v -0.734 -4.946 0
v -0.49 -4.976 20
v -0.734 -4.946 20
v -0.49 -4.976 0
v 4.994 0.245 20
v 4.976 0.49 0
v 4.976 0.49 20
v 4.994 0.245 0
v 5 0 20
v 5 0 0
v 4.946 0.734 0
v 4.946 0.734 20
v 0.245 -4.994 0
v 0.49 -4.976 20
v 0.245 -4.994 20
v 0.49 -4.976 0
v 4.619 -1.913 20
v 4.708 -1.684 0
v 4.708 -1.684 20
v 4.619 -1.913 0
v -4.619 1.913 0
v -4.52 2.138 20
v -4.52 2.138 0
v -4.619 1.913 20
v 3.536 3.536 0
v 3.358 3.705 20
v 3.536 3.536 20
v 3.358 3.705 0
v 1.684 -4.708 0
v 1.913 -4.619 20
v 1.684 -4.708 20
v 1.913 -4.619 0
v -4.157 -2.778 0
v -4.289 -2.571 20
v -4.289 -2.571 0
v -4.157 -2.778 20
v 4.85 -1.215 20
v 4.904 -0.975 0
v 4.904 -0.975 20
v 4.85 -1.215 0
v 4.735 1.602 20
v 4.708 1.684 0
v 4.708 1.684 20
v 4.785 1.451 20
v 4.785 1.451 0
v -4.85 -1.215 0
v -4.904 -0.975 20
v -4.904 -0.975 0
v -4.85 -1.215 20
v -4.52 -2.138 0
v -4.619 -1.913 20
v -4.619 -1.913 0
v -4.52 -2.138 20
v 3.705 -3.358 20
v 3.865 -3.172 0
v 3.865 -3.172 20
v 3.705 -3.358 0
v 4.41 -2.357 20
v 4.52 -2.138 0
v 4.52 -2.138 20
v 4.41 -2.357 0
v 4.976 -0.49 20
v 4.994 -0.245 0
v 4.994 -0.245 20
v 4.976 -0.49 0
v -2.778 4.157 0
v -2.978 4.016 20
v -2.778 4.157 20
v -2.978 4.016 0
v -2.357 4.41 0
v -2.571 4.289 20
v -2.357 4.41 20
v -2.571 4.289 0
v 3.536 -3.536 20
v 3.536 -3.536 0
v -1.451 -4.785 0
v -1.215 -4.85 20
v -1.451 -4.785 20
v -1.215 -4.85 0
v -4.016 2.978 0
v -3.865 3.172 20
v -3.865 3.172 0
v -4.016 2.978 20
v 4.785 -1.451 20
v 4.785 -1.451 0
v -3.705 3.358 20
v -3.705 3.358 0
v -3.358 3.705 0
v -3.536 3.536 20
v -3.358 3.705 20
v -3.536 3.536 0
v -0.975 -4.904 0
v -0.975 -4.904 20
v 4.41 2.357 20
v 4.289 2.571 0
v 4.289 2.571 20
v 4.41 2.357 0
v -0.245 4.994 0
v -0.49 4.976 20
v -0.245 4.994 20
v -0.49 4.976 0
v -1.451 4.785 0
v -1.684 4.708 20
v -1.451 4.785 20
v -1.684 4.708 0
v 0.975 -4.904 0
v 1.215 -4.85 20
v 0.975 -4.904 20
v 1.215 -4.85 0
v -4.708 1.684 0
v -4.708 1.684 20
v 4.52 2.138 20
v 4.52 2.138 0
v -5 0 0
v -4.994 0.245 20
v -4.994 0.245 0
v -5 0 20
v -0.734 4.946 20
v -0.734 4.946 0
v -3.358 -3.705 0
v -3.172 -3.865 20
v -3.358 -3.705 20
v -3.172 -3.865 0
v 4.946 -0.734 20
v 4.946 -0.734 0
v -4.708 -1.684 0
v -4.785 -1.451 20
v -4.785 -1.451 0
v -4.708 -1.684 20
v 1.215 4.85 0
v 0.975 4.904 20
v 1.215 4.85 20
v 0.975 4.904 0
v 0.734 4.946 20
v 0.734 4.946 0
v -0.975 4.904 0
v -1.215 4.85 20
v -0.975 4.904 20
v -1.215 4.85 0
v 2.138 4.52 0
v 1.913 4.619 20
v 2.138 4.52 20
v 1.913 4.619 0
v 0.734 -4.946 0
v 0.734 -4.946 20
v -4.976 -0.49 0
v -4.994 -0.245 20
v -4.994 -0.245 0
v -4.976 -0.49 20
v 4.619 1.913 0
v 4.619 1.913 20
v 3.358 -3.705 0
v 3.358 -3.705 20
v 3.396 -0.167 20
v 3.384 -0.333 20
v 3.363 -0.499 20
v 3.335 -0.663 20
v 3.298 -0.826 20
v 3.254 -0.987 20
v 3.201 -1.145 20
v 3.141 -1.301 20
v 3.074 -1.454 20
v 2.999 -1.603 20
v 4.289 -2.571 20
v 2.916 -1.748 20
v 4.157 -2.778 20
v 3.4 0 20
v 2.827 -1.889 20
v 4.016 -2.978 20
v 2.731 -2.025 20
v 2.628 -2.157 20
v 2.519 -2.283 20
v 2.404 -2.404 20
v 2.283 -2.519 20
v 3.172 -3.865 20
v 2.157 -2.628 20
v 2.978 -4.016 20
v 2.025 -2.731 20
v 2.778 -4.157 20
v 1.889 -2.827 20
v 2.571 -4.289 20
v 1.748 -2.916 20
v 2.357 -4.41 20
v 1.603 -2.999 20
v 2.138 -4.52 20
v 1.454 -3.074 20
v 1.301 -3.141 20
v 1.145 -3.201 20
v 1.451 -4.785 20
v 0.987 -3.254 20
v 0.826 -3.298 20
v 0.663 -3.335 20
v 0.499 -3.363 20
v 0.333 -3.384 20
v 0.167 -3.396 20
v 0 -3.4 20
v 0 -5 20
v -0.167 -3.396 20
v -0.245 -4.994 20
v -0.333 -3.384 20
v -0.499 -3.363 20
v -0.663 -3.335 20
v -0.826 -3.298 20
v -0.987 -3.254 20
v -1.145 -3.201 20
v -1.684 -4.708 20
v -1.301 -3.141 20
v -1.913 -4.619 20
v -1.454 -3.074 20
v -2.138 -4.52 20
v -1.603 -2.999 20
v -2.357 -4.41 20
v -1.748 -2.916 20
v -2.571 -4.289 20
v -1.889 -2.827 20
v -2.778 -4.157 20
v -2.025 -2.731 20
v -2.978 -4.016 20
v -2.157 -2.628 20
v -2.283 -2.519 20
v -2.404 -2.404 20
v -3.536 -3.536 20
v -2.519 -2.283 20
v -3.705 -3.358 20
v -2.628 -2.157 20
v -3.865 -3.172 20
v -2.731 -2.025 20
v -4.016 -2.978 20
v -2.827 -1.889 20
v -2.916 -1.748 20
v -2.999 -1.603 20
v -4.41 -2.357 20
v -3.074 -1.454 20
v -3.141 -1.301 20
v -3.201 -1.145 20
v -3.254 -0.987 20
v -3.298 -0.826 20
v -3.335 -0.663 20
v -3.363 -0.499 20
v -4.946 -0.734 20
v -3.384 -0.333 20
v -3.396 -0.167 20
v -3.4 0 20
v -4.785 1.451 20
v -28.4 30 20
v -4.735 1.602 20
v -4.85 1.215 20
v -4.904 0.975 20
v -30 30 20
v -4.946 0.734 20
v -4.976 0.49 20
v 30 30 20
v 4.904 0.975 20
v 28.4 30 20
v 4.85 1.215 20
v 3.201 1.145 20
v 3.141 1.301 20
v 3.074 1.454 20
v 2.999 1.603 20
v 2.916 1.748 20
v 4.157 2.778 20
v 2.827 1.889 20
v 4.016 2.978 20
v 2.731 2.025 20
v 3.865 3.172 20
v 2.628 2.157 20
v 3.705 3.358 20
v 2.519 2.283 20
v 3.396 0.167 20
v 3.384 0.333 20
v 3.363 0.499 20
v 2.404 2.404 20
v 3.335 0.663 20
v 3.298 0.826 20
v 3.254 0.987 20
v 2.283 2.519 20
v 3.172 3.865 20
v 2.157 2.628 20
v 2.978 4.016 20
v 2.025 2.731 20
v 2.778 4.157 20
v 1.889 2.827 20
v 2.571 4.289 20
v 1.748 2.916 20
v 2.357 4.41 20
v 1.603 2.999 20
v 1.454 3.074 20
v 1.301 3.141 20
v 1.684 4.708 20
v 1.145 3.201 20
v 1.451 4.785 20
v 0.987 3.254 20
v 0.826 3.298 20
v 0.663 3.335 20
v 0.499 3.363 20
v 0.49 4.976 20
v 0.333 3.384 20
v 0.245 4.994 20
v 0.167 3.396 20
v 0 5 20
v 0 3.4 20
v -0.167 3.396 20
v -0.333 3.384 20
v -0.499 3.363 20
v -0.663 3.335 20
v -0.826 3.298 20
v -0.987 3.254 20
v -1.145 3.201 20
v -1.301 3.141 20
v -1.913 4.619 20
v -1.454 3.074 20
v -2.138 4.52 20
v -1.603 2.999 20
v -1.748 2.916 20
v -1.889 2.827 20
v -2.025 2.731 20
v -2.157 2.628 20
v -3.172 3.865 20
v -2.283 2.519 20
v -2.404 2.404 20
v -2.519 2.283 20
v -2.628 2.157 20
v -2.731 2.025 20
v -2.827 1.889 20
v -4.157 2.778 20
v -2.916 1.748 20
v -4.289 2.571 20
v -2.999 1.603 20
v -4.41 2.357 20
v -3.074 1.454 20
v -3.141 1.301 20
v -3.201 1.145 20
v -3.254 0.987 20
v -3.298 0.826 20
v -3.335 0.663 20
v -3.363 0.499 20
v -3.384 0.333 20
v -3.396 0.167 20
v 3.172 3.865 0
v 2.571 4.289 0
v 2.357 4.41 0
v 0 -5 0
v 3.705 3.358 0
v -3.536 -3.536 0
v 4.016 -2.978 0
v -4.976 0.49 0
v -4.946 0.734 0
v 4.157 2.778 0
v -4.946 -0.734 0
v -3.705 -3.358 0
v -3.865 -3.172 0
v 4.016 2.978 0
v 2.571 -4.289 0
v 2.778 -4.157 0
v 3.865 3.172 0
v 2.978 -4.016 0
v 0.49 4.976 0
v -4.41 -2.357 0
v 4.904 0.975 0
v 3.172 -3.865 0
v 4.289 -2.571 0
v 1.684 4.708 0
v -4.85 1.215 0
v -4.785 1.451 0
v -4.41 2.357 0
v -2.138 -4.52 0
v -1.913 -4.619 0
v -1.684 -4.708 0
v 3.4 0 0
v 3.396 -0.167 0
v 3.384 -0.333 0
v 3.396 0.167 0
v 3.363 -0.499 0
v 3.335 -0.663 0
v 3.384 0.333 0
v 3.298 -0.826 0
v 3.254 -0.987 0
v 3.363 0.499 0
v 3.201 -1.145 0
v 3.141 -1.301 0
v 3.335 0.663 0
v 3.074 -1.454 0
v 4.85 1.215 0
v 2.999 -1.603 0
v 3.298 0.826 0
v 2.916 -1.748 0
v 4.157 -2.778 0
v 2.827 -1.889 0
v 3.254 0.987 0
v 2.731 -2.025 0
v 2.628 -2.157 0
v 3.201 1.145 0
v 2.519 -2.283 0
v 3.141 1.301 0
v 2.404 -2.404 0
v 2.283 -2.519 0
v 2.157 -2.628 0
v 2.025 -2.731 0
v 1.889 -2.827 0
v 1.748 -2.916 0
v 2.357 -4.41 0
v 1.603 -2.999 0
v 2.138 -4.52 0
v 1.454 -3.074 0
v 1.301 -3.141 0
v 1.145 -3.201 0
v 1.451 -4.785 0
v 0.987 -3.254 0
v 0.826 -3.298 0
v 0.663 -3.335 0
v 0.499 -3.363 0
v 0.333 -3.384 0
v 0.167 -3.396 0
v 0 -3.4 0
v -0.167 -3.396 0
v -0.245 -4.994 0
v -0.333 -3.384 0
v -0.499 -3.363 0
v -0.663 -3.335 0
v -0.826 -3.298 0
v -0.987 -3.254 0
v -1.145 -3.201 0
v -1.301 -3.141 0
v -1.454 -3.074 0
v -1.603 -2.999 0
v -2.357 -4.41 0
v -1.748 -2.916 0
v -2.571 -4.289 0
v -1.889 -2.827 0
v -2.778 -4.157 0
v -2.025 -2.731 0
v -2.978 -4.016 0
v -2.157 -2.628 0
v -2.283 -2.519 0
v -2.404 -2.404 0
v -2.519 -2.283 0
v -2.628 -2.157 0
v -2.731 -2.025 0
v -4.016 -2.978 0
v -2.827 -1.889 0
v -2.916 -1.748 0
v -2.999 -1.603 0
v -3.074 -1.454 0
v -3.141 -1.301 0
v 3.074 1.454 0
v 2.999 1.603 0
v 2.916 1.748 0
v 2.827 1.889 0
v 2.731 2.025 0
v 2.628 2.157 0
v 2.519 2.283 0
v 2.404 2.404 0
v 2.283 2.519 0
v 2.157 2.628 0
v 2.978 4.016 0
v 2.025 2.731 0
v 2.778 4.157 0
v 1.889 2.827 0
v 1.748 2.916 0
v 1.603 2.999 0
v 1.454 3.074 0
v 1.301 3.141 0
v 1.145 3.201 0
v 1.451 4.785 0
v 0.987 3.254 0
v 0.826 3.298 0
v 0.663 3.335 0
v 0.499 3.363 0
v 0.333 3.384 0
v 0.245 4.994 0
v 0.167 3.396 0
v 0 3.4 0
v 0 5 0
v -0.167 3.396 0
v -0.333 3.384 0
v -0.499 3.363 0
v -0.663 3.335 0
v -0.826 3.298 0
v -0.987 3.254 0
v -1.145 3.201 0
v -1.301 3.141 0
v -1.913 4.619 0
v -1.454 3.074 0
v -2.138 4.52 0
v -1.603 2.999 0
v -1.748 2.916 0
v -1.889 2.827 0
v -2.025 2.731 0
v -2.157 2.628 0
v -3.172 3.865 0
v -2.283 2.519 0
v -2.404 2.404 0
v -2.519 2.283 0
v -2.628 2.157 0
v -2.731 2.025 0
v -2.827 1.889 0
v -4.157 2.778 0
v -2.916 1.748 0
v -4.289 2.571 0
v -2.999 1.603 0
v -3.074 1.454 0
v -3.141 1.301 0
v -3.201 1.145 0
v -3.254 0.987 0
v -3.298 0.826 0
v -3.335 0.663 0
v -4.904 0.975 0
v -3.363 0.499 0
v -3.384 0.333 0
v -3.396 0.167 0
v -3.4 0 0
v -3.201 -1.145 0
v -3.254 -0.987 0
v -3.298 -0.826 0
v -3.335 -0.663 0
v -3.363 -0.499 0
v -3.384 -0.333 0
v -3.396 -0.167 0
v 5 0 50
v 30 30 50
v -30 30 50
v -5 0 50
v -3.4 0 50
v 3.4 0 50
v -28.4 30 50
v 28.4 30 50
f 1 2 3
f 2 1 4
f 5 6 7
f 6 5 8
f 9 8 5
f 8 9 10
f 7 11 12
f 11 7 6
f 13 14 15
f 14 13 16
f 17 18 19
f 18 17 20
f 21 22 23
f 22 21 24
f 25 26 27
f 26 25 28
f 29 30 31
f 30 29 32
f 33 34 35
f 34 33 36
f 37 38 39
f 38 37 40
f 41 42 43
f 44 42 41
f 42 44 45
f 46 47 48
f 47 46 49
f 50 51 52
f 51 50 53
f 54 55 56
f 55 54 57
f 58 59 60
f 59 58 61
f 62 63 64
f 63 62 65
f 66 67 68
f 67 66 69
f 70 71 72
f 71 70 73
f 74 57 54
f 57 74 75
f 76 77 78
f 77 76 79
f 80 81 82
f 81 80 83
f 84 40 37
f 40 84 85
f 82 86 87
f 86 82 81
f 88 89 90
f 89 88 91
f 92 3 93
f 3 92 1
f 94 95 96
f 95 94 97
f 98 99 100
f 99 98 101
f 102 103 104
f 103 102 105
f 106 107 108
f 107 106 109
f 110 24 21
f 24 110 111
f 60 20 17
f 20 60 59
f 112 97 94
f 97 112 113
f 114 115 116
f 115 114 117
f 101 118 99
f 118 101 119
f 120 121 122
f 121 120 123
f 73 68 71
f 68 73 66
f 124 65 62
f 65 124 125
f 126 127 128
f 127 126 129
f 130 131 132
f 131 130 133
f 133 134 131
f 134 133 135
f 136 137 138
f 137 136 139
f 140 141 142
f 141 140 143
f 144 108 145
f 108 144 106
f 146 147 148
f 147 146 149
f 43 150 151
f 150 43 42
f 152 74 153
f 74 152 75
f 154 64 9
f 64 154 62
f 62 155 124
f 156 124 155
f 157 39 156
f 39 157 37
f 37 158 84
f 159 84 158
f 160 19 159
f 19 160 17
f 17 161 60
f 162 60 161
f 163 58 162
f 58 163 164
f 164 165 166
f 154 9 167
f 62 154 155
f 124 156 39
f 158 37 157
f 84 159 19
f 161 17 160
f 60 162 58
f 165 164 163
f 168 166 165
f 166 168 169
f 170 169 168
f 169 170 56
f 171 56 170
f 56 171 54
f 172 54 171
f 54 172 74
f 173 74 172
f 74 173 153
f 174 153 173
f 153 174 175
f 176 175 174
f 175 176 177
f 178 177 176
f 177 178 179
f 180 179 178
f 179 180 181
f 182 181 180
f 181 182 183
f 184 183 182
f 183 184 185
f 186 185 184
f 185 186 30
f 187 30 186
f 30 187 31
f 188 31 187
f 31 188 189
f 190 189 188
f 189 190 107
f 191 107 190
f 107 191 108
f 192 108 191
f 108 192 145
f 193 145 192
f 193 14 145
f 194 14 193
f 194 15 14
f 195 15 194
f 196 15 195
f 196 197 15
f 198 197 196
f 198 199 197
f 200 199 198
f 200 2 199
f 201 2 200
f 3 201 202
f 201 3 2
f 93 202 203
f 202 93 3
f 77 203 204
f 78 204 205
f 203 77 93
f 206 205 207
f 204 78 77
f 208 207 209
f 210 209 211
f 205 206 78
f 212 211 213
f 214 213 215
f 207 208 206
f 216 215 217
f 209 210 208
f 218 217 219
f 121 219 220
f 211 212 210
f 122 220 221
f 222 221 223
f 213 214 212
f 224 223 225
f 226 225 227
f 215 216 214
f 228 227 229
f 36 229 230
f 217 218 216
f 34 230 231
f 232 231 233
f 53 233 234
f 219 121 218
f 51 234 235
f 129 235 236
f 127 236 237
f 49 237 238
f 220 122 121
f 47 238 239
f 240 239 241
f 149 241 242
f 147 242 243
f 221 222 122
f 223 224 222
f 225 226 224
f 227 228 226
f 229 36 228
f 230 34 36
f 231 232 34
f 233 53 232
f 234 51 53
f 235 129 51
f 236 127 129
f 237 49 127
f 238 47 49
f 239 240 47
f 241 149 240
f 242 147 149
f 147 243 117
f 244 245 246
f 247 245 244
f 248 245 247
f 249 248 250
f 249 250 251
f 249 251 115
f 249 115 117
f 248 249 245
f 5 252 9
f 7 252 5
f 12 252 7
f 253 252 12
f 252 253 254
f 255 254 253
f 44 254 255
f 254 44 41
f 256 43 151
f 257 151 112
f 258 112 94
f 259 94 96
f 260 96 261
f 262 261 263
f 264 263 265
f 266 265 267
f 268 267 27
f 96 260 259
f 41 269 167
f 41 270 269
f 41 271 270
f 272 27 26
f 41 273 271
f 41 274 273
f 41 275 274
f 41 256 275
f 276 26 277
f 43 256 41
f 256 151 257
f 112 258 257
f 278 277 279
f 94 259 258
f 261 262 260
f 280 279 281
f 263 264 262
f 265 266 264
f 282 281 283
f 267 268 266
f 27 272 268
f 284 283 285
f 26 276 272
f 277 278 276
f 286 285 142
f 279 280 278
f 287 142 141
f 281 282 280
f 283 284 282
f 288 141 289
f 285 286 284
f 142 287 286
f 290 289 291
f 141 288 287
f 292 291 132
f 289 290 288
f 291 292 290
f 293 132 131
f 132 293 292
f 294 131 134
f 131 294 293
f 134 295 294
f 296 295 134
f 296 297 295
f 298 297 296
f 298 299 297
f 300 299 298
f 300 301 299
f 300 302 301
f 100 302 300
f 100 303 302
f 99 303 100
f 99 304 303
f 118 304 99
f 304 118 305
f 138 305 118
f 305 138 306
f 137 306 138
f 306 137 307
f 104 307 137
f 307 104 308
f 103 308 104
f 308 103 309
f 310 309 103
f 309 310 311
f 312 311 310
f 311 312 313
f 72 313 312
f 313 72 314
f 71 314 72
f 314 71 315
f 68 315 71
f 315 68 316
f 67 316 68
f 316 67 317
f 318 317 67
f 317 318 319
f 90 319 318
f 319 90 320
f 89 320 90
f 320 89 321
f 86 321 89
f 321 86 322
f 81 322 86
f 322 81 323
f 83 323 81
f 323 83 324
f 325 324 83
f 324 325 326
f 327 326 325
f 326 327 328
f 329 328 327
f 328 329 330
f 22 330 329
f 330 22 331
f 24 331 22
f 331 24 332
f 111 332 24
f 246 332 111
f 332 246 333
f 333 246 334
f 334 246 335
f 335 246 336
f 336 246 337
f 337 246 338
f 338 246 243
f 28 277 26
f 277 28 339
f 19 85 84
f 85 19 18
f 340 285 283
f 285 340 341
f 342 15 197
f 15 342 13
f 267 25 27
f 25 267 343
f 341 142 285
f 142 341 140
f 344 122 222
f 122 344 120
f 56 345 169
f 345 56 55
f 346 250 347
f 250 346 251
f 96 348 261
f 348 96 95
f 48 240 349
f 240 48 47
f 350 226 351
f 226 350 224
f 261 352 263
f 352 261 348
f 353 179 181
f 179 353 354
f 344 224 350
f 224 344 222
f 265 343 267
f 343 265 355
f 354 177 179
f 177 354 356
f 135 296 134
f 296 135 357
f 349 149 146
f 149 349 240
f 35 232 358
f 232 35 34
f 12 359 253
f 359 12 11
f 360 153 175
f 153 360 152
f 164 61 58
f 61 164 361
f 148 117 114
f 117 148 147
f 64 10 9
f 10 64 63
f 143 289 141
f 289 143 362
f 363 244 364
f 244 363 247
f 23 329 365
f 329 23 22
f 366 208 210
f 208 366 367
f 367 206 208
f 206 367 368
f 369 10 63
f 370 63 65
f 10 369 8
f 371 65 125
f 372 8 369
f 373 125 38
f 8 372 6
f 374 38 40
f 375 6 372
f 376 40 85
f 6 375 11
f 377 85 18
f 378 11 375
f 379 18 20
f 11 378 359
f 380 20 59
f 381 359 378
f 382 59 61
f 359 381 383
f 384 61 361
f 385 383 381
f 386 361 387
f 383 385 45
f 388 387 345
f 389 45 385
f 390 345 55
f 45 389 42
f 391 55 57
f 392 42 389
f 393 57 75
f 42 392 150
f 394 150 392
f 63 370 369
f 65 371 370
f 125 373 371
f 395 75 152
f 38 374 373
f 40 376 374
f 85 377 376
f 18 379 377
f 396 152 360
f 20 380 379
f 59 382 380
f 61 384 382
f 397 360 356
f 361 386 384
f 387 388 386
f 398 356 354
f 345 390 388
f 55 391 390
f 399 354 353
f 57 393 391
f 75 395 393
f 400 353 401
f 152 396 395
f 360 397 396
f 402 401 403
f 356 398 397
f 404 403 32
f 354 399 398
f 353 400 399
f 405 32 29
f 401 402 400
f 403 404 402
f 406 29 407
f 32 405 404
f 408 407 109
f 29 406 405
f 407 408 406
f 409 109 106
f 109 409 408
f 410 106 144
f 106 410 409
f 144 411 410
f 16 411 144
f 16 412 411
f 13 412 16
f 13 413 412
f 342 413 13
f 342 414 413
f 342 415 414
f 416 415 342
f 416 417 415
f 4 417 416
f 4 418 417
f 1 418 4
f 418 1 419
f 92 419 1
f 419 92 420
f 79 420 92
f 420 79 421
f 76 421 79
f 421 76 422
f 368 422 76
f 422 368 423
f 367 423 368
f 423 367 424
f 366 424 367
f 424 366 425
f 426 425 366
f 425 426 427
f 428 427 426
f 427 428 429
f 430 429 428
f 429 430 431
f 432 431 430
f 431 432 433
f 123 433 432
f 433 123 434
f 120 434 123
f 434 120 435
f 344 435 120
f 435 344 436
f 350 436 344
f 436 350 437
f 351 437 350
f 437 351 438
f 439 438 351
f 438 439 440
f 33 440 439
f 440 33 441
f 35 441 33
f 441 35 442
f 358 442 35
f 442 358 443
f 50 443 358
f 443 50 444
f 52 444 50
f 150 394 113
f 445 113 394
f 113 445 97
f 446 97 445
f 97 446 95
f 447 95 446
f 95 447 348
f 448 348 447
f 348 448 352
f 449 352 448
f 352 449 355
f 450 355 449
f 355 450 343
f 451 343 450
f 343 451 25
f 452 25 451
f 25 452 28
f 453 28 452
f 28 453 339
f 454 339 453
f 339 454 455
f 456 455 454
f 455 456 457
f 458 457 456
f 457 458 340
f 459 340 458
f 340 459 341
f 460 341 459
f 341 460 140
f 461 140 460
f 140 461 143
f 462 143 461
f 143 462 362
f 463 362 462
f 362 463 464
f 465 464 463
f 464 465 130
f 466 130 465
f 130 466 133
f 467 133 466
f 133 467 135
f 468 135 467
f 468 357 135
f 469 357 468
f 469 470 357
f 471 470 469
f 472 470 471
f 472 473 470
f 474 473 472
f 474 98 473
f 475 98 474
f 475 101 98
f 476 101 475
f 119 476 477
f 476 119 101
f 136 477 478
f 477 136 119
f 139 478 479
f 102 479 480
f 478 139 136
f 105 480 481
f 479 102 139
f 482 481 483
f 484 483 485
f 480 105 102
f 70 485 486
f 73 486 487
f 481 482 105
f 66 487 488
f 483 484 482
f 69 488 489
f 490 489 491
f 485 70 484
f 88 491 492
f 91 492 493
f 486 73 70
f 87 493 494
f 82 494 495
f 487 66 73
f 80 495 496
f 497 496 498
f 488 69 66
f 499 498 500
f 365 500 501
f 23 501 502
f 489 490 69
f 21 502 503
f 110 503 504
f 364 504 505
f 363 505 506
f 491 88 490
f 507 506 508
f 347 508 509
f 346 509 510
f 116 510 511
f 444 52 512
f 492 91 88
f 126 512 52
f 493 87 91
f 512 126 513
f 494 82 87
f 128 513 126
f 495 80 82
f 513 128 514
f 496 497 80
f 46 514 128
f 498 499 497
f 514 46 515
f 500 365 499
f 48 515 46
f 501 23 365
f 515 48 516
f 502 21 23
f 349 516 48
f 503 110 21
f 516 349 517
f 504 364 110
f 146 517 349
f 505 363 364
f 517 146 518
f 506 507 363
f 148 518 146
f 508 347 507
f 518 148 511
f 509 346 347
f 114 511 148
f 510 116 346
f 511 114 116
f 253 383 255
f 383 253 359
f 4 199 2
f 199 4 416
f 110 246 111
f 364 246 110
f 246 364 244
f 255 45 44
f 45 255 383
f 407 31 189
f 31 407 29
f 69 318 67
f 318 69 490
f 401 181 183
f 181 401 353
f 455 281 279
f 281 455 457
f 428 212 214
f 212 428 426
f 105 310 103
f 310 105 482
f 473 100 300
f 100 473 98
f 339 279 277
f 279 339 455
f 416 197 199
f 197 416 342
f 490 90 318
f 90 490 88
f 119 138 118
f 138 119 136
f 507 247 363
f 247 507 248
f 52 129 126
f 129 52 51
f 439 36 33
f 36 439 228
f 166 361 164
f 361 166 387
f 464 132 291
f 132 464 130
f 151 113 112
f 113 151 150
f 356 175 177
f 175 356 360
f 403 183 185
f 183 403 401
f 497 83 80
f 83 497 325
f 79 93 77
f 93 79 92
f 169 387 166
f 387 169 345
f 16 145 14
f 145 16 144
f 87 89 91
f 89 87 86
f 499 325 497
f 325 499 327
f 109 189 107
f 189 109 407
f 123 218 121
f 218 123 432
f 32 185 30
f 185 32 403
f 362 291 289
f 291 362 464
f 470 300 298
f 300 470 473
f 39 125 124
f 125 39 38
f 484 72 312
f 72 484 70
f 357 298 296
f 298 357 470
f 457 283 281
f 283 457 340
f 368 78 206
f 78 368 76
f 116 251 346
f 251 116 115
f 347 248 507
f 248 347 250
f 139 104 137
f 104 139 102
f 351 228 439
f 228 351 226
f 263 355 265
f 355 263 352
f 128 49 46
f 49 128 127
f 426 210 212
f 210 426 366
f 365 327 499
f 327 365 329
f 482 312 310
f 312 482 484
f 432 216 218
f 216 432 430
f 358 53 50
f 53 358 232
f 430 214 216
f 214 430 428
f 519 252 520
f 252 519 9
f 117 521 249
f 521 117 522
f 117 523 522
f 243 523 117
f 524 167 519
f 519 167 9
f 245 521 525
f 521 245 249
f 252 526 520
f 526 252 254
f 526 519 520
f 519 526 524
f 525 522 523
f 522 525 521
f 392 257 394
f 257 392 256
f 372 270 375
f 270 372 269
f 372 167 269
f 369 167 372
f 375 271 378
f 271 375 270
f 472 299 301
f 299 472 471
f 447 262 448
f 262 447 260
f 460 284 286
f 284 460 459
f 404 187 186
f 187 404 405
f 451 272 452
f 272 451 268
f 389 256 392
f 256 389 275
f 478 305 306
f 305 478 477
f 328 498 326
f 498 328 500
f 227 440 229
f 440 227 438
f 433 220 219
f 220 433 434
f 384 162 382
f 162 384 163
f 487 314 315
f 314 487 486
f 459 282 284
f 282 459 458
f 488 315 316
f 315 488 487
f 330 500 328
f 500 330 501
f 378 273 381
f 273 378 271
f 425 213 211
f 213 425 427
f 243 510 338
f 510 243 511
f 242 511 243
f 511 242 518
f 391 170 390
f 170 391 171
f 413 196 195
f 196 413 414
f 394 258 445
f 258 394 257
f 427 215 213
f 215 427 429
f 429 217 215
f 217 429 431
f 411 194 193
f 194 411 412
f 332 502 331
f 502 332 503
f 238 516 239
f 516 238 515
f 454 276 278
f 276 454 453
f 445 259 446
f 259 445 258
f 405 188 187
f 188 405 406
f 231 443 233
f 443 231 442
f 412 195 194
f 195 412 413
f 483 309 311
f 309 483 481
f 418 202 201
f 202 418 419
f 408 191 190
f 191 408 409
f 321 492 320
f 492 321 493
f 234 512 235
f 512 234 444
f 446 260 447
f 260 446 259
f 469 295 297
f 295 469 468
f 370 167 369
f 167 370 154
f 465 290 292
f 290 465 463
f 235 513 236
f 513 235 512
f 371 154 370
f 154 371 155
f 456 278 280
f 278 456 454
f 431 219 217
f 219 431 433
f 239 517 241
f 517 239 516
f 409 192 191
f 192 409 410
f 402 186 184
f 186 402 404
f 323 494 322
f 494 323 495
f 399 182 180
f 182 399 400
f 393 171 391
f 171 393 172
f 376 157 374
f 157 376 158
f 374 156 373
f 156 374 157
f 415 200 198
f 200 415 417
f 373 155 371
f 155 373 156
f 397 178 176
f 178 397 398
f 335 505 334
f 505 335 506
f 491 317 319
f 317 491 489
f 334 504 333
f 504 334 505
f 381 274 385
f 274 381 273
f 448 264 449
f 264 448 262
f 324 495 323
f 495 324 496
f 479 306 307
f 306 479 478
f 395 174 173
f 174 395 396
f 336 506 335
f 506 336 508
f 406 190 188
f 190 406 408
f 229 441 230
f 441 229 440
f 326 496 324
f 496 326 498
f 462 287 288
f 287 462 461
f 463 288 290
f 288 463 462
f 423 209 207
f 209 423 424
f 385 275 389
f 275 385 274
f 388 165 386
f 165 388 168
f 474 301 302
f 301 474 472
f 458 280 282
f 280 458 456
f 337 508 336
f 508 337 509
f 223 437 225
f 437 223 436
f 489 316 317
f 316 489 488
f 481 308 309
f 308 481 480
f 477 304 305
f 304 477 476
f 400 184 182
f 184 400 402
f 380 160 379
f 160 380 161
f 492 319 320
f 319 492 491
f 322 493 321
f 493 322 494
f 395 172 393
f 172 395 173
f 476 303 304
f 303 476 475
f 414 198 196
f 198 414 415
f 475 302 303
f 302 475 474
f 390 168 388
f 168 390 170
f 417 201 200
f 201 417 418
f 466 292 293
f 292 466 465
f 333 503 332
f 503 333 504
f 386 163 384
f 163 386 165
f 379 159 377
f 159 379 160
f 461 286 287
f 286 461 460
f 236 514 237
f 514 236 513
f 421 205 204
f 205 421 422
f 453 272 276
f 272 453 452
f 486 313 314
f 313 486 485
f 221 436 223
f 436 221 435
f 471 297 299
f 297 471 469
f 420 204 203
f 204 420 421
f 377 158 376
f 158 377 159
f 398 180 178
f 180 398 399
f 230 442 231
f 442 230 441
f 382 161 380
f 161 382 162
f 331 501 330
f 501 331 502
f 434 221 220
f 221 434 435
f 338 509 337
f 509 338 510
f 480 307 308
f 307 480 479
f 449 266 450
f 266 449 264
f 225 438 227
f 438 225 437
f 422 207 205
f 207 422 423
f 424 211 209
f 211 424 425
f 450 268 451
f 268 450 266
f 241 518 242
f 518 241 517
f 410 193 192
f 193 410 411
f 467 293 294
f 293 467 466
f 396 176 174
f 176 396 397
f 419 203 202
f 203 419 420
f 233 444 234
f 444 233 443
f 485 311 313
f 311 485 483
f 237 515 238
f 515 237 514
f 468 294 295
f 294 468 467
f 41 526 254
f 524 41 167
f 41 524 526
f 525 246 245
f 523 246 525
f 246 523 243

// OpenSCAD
// Lab Funnel Design
// Units: millimetres
// Orientation: Upright, wide opening at top, rests on XY plane at z=0

$fn = 128; // High resolution for smooth curves

// --- Dimensions ---
// Spout (Tube)
spout_outer_diameter = 10;
spout_inner_diameter = 6.8;
spout_length = 20;

// Cone (Funnel)
cone_bottom_diameter = 10; // Matches spout outer diameter
cone_top_diameter = 60;
cone_height = 30; // From z=20 to z=50

// Wall Thickness
wall_thickness = 1.6;

// Derived Inner Cone Dimensions
cone_bottom_inner_diameter = cone_bottom_diameter - (2 * wall_thickness);
cone_top_inner_diameter = cone_top_diameter - (2 * wall_thickness);

// --- Construction ---
// We build the outer shell and subtract the inner void.
// The part sits on the XY plane at z=0.

difference() {
    // --- OUTER SHELL ---
    union() {
        // 1. Spout Outer Cylinder (z=0 to z=20)
        cylinder(
            h = spout_length,
            d = spout_outer_diameter,
            center = false
        );

        // 2. Cone Outer Frustum (z=20 to z=50)
        // We use rotate_extrude to create a solid of revolution.
        // The profile is defined in the XZ plane.
        // We translate the profile so it starts at z=20.
        translate([0, 0, spout_length]) {
            // Profile: Line from (radius_bottom, 0) to (radius_top, height)
            // We use a polygon to close the loop for the extruder, but only the line matters for the surface.
            // Actually, rotate_extrude takes a 2D path. A simple line segment rotated creates a cone.
            // To ensure a solid, we can extrude a filled polygon or just use the line if the tool interprets it as a sweep.
            // Standard practice: Use a polygon that includes the axis to make a solid cone, OR just the line if we trust the tool.
            // However, to be safe and watertight, we define a polygon that goes from -radius to +radius.
            
            linear_extrude(height = cone_height, center = false) {
                polygon(
                    points = [
                        [-cone_bottom_diameter/2, 0],
                        [cone_bottom_diameter/2, 0],
                        [cone_top_diameter/2, cone_height],
                        [-cone_top_diameter/2, cone_height]
                    ],
                    convex = false
                );
            }
        }
    }

    // --- INNER VOID ---
    // Subtract the inner volume to create the bore.
    union() {
        // 1. Inner Cylinder (Spout Bore)
        cylinder(
            h = spout_length,
            d = spout_inner_diameter,
            center = false
        );

        // 2. Inner Cone Frustum
        translate([0, 0, spout_length]) {
            linear_extrude(height = cone_height, center = false) {
                polygon(
                    points = [
                        [-cone_bottom_inner_diameter/2, 0],
                        [cone_bottom_inner_diameter/2, 0],
                        [cone_top_inner_diameter/2, cone_height],
                        [-cone_top_inner_diameter/2, cone_height]
                    ],
                    convex = false
                );
            }
        }
    }
}
